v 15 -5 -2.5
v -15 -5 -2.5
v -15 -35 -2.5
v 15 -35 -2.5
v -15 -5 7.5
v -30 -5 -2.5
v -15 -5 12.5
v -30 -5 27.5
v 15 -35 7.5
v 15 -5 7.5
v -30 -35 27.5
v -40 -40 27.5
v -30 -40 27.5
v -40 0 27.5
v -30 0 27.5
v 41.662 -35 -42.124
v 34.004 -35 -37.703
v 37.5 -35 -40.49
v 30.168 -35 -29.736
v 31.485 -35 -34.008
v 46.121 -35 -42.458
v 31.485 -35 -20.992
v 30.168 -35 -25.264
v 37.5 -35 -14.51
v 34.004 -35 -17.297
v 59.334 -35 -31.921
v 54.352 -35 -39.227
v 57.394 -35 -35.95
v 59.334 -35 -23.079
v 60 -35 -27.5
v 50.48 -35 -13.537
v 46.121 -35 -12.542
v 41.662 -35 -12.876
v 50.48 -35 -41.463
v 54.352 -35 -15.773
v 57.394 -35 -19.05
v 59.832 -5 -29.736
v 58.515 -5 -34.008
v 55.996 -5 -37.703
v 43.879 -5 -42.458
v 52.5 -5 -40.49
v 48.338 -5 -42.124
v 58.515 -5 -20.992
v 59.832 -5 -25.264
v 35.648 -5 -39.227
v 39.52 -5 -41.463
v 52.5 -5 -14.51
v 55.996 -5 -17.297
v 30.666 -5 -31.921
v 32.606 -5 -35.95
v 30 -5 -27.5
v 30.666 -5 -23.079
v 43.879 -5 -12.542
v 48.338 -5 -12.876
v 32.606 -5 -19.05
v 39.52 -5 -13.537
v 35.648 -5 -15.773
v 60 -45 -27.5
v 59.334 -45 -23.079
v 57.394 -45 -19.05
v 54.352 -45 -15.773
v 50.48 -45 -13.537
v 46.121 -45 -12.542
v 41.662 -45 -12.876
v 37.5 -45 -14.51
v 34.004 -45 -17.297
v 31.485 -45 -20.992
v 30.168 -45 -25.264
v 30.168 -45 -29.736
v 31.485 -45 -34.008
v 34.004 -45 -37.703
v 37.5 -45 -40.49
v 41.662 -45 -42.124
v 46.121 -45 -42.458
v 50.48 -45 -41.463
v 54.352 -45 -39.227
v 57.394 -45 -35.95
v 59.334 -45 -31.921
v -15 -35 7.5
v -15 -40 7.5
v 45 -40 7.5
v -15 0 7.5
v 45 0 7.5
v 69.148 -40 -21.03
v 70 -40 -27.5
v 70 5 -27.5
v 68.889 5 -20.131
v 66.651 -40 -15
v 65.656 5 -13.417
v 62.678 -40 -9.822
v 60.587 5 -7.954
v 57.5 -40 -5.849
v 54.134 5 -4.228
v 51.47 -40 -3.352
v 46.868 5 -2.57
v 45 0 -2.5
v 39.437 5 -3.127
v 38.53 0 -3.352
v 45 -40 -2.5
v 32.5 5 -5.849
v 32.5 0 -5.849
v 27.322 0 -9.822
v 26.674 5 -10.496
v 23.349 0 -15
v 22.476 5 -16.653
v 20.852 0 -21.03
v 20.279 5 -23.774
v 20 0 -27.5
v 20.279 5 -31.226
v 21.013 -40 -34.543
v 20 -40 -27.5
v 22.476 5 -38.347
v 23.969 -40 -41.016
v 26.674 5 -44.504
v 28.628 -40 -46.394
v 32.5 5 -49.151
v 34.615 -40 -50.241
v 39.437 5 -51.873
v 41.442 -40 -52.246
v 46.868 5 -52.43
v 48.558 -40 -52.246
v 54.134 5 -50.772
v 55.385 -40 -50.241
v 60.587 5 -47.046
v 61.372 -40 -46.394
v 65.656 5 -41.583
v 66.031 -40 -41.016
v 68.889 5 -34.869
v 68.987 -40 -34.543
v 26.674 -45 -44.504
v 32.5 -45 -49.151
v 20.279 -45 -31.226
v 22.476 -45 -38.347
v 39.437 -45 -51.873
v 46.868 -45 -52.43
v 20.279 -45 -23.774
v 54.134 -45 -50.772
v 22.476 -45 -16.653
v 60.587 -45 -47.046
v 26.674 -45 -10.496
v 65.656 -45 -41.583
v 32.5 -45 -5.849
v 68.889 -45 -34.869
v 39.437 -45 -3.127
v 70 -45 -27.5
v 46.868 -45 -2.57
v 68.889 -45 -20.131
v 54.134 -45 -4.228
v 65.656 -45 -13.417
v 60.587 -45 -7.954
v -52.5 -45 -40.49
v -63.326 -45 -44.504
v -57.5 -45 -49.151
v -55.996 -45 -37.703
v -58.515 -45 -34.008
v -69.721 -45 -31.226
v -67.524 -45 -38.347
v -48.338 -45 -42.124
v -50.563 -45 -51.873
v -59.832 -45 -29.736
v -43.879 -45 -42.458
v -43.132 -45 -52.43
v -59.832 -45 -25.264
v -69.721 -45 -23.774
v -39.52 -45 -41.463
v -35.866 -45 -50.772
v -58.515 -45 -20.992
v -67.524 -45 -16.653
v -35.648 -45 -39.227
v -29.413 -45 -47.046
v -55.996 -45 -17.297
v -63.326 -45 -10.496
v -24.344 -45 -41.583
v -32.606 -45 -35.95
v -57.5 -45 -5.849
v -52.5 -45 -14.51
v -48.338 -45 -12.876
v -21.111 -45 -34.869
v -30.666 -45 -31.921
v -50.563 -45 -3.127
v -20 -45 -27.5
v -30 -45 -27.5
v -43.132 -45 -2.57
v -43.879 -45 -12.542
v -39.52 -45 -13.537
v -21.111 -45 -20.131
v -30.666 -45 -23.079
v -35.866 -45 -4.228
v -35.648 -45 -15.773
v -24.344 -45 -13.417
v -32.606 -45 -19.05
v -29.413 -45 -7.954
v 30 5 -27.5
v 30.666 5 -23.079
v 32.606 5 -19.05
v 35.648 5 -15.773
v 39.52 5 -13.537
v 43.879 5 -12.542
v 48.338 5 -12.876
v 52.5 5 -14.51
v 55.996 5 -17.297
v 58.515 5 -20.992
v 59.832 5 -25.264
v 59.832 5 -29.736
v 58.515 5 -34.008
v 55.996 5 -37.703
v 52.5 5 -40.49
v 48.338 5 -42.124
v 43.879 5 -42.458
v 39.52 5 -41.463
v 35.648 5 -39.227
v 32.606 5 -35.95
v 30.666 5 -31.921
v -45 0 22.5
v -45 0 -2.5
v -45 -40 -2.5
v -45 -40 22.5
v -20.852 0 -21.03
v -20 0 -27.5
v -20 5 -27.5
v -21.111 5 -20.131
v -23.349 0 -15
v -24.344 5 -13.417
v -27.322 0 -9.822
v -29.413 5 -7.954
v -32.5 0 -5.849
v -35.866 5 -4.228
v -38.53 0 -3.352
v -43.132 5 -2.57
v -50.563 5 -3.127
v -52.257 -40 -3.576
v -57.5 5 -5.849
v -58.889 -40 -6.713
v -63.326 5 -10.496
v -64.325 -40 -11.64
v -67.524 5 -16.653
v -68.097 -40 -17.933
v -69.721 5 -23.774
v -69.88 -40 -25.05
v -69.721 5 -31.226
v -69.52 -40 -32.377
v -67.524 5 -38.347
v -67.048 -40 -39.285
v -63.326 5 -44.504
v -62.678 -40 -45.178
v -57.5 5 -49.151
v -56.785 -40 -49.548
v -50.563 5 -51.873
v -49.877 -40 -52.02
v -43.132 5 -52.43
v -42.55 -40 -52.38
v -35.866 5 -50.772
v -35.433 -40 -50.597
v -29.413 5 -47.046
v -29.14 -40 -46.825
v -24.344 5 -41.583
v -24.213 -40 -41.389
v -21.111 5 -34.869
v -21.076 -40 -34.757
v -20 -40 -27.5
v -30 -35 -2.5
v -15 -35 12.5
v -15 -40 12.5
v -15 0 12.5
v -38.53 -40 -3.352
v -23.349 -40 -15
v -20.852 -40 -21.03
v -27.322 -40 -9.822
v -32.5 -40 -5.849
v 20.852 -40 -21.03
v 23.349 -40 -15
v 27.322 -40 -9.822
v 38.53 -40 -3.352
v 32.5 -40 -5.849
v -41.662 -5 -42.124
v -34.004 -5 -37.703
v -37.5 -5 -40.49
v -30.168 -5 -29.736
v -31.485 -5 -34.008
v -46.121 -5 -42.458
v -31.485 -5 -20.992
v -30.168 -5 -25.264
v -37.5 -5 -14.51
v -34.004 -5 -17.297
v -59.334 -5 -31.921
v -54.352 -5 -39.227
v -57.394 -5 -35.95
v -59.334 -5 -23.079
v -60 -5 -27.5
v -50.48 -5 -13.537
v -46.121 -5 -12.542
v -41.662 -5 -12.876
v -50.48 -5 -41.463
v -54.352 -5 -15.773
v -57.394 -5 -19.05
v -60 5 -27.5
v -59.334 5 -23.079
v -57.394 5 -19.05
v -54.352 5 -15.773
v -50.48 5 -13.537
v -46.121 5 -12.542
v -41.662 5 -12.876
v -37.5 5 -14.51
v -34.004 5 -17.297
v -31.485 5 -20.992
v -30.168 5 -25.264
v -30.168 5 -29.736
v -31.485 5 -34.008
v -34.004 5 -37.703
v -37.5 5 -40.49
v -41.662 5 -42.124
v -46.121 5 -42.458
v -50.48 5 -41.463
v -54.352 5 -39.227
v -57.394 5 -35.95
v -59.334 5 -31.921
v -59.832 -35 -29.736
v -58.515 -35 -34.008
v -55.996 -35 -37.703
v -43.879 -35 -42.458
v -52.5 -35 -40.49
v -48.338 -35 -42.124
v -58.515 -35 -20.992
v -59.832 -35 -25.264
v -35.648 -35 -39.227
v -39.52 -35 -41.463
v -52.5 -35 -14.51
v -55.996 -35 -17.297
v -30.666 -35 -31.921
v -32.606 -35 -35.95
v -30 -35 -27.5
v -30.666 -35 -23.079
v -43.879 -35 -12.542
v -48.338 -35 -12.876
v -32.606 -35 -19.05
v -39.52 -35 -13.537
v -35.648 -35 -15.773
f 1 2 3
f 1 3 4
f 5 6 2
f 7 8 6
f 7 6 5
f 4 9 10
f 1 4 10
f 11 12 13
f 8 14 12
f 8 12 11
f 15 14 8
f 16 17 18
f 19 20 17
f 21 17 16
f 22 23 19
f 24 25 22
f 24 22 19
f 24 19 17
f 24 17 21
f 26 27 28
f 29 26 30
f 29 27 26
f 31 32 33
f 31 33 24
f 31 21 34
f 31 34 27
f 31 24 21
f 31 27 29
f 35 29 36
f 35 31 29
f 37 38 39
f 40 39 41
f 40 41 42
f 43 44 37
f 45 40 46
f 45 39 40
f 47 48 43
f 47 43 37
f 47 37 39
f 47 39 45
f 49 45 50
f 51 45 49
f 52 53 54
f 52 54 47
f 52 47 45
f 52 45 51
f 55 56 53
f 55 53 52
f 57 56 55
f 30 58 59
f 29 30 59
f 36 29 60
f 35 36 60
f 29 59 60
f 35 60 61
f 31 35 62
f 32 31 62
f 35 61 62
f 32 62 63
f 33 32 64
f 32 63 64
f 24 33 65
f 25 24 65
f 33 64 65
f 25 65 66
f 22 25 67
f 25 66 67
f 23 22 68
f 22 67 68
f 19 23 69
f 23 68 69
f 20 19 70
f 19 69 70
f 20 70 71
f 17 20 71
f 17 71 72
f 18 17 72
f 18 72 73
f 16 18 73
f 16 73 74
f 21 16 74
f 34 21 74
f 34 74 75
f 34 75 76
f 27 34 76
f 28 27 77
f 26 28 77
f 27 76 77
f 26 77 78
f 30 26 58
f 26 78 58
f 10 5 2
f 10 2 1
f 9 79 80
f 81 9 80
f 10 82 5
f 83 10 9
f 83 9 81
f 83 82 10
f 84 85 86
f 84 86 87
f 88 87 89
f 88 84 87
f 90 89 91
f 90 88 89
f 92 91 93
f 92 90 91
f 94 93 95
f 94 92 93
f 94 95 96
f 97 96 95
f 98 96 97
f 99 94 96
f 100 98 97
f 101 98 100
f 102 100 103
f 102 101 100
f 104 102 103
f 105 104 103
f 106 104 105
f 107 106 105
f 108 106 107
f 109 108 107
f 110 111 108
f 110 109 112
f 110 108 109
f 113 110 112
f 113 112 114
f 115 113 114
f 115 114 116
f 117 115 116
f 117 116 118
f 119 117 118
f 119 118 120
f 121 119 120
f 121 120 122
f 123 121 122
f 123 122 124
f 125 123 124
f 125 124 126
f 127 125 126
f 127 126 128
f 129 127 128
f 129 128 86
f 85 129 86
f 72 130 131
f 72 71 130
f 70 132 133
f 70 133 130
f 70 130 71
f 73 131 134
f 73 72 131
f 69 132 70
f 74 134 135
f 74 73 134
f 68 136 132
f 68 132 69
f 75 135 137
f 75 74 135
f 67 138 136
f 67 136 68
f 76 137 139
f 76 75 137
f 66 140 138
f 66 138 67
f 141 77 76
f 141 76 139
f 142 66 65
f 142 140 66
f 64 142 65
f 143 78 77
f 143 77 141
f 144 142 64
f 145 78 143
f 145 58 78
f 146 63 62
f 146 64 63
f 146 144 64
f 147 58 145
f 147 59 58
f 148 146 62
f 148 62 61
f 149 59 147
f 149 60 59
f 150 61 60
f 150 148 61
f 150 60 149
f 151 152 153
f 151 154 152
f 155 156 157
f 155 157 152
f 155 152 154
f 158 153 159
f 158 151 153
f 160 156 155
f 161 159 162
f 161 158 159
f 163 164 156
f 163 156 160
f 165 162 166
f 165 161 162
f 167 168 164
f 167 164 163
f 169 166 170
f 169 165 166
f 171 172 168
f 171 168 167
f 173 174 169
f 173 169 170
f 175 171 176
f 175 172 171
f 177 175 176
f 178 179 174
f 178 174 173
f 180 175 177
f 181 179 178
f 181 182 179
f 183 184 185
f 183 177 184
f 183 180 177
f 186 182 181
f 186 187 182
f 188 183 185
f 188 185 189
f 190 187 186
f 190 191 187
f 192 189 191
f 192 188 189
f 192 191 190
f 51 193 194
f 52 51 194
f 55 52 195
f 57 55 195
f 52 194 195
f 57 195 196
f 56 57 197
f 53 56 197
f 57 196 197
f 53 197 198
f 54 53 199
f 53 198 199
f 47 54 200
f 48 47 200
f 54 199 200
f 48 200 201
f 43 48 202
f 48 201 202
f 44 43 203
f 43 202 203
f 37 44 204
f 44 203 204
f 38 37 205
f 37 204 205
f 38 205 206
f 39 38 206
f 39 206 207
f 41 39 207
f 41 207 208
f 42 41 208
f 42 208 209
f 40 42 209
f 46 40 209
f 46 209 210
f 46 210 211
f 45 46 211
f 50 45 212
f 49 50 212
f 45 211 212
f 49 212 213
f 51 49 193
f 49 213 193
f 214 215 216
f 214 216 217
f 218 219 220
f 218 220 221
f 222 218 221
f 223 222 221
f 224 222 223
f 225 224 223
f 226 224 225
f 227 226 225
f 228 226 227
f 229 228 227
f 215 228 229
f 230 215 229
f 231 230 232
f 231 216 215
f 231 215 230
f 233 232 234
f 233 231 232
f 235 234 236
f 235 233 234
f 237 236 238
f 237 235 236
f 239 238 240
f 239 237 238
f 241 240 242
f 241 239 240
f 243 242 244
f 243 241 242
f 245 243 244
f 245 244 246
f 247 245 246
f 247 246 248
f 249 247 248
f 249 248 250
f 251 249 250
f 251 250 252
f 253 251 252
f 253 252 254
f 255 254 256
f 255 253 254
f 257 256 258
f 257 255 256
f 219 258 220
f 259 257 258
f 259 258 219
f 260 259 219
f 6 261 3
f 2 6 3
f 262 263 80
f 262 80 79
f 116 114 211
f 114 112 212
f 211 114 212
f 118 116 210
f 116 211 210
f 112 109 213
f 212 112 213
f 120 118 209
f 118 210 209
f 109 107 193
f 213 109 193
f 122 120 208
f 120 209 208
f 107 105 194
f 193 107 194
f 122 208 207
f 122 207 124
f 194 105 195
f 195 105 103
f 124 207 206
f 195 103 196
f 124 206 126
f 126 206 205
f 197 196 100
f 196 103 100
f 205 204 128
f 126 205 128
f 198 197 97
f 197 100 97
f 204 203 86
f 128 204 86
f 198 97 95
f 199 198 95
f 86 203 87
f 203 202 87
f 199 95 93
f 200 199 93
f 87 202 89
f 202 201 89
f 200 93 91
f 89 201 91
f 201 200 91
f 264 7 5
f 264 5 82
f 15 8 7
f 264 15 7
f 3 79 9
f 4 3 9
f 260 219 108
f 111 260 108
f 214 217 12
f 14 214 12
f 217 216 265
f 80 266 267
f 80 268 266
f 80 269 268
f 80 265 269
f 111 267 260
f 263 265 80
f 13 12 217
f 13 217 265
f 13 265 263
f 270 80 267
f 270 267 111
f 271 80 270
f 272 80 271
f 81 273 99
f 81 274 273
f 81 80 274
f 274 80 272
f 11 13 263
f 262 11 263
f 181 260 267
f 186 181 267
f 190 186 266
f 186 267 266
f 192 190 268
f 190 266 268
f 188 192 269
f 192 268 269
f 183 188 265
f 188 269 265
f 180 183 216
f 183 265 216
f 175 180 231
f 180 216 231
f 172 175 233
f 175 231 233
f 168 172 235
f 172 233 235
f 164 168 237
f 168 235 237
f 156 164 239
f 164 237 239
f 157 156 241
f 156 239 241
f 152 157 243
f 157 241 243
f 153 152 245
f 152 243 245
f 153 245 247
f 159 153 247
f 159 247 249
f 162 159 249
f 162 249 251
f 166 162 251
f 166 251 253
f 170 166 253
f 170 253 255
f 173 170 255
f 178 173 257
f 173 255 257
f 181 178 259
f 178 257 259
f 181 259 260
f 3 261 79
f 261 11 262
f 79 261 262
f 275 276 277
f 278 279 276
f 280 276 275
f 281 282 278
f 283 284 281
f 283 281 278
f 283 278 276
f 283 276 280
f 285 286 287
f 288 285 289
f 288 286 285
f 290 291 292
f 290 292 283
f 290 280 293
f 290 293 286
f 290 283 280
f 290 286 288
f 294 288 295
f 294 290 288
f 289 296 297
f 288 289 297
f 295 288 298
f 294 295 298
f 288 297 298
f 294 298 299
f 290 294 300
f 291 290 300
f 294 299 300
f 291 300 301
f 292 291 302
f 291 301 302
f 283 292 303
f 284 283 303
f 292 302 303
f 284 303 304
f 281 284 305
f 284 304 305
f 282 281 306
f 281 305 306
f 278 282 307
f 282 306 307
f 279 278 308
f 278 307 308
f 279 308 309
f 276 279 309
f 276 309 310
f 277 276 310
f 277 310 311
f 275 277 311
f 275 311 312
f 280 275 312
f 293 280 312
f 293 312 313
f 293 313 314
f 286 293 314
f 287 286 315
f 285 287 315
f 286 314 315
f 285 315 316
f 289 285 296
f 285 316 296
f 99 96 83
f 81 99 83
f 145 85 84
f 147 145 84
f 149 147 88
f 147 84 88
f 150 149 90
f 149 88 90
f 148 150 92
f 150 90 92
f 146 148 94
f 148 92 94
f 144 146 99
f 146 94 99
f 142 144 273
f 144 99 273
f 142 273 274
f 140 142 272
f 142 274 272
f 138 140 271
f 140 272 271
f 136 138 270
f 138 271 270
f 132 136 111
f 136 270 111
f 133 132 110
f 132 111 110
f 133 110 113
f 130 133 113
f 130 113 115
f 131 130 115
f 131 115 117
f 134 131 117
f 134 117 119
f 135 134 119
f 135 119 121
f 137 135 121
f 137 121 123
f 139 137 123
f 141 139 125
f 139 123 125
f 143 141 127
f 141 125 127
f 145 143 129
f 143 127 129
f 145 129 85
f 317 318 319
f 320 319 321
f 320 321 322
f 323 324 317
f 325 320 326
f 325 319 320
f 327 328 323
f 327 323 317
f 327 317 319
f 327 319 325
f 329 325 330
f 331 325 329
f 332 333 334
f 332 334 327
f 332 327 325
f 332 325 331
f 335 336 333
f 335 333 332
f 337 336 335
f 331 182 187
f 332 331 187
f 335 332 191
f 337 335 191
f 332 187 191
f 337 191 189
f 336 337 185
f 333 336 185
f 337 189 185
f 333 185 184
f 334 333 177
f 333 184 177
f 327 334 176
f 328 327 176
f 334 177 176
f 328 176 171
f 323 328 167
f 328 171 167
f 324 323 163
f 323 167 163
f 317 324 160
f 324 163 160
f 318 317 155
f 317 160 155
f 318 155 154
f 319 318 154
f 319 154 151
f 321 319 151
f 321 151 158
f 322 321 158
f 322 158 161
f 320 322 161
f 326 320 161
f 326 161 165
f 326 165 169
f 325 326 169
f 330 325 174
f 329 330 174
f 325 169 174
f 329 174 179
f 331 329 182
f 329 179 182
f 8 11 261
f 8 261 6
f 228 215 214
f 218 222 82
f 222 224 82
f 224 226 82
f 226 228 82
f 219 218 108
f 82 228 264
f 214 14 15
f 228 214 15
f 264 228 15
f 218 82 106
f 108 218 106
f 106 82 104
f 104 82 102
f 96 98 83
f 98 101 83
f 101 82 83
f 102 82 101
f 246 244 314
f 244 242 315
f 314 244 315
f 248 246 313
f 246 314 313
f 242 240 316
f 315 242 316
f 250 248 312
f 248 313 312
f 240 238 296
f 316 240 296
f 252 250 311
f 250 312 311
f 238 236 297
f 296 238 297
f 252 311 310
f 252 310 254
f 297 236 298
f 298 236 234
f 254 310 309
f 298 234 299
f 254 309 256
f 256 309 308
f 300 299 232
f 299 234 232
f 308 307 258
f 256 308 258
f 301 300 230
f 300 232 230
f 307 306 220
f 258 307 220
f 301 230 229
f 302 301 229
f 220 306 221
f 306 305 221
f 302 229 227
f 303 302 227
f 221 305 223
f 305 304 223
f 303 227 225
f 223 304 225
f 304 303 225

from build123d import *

# Parameters (mm, degrees)
F0_W      = 90
F0_H      = 55
F1_DEPTH  = 40
F2_R      = 25
F3_DEPTH  = 45
F4_R      = 25
F5_DEPTH  = 5
F6_W      = 60
F6_H      = 40
F7_DEPTH  = 20
F8_W      = 30
F8_H      = 30
F9_DEPTH  = 10
F10_W     = 15
F10_H     = 30
F11_DEPTH = 30
F13_DEPTH = 45.001
F14_R     = 15
F15_DEPTH = 10
F16_R     = 15
F17_DEPTH = 10
F18_R     = 15
F19_DEPTH = 10
F20_R     = 15
F21_DEPTH = 10


with BuildPart() as f1:
    # F0 (on Front) → F1 (new body)
    with BuildSketch(Plane.XZ):
        Rectangle(F0_W, F0_H)
    extrude(amount=F1_DEPTH)

    # F2 (on face) → F3 (join)
    with BuildSketch(Plane.XZ.offset(40)):
        with Locations((-45, -27.5)):
            Circle(F2_R)
        with Locations((45, -27.5)):
            Circle(F2_R)
    extrude(amount=-F3_DEPTH)

    # F4 (on face) → F5 (join)
    with BuildSketch(Plane.XZ.offset(40)):
        with Locations((-45, -27.5)):
            Circle(F4_R)
        with Locations((45, -27.5)):
            Circle(F4_R)
    extrude(amount=F5_DEPTH)

    # F6 (on face) → F7 (cut)
    with BuildSketch(Plane.XY.offset(27.5)):
        with Locations((15, -20)):
            Rectangle(F6_W, F6_H)
    extrude(amount=-F7_DEPTH, mode=Mode.SUBTRACT)

    # F8 (on face) → F9 (cut)
    with BuildSketch(Plane.XY.offset(7.5)):
        with Locations((0, -20)):
            Rectangle(F8_W, F8_H)
    extrude(amount=-F9_DEPTH, mode=Mode.SUBTRACT)

    # F10 (on face) → F11 (cut)
    with BuildSketch(Plane.XY.offset(27.5)):
        with Locations((-22.5, -20)):
            Rectangle(F10_W, F10_H)
    extrude(amount=-F11_DEPTH, mode=Mode.SUBTRACT)

    # F12 (on face) → F13 (cut, through all)
    with BuildSketch(Plane.XZ.offset(40)):
        Polygon((-15, 27.5), (-30, 27.5), (-15, 12.5), align=None)
        Polygon((-45, 22.5), (-40, 27.5), (-45, 27.5), align=None)
    extrude(amount=-F13_DEPTH, mode=Mode.SUBTRACT)

    # F14 (on face) → F15 (cut)
    with BuildSketch(Plane.XZ.offset(45)):
        with Locations((-45, -27.5)):
            Circle(F14_R)
    extrude(amount=-F15_DEPTH, mode=Mode.SUBTRACT)

    # F16 (on face) → F17 (cut)
    with BuildSketch(Plane.XZ.offset(45)):
        with Locations((45, -27.5)):
            Circle(F16_R)
    extrude(amount=-F17_DEPTH, mode=Mode.SUBTRACT)

    # F18 (on face) → F19 (cut)
    with BuildSketch(Plane(origin=(0, 5, 0), x_dir=(-1, 0, 0), z_dir=(0, 1, 0))):
        with Locations((-45, -27.5)):
            Circle(F18_R)
    extrude(amount=-F19_DEPTH, mode=Mode.SUBTRACT)

    # F20 (on face) → F21 (cut)
    with BuildSketch(Plane(origin=(0, 5, 0), x_dir=(-1, 0, 0), z_dir=(0, 1, 0))):
        with Locations((45, -27.5)):
            Circle(F20_R)
    extrude(amount=-F21_DEPTH, mode=Mode.SUBTRACT)


solid = f1.part
